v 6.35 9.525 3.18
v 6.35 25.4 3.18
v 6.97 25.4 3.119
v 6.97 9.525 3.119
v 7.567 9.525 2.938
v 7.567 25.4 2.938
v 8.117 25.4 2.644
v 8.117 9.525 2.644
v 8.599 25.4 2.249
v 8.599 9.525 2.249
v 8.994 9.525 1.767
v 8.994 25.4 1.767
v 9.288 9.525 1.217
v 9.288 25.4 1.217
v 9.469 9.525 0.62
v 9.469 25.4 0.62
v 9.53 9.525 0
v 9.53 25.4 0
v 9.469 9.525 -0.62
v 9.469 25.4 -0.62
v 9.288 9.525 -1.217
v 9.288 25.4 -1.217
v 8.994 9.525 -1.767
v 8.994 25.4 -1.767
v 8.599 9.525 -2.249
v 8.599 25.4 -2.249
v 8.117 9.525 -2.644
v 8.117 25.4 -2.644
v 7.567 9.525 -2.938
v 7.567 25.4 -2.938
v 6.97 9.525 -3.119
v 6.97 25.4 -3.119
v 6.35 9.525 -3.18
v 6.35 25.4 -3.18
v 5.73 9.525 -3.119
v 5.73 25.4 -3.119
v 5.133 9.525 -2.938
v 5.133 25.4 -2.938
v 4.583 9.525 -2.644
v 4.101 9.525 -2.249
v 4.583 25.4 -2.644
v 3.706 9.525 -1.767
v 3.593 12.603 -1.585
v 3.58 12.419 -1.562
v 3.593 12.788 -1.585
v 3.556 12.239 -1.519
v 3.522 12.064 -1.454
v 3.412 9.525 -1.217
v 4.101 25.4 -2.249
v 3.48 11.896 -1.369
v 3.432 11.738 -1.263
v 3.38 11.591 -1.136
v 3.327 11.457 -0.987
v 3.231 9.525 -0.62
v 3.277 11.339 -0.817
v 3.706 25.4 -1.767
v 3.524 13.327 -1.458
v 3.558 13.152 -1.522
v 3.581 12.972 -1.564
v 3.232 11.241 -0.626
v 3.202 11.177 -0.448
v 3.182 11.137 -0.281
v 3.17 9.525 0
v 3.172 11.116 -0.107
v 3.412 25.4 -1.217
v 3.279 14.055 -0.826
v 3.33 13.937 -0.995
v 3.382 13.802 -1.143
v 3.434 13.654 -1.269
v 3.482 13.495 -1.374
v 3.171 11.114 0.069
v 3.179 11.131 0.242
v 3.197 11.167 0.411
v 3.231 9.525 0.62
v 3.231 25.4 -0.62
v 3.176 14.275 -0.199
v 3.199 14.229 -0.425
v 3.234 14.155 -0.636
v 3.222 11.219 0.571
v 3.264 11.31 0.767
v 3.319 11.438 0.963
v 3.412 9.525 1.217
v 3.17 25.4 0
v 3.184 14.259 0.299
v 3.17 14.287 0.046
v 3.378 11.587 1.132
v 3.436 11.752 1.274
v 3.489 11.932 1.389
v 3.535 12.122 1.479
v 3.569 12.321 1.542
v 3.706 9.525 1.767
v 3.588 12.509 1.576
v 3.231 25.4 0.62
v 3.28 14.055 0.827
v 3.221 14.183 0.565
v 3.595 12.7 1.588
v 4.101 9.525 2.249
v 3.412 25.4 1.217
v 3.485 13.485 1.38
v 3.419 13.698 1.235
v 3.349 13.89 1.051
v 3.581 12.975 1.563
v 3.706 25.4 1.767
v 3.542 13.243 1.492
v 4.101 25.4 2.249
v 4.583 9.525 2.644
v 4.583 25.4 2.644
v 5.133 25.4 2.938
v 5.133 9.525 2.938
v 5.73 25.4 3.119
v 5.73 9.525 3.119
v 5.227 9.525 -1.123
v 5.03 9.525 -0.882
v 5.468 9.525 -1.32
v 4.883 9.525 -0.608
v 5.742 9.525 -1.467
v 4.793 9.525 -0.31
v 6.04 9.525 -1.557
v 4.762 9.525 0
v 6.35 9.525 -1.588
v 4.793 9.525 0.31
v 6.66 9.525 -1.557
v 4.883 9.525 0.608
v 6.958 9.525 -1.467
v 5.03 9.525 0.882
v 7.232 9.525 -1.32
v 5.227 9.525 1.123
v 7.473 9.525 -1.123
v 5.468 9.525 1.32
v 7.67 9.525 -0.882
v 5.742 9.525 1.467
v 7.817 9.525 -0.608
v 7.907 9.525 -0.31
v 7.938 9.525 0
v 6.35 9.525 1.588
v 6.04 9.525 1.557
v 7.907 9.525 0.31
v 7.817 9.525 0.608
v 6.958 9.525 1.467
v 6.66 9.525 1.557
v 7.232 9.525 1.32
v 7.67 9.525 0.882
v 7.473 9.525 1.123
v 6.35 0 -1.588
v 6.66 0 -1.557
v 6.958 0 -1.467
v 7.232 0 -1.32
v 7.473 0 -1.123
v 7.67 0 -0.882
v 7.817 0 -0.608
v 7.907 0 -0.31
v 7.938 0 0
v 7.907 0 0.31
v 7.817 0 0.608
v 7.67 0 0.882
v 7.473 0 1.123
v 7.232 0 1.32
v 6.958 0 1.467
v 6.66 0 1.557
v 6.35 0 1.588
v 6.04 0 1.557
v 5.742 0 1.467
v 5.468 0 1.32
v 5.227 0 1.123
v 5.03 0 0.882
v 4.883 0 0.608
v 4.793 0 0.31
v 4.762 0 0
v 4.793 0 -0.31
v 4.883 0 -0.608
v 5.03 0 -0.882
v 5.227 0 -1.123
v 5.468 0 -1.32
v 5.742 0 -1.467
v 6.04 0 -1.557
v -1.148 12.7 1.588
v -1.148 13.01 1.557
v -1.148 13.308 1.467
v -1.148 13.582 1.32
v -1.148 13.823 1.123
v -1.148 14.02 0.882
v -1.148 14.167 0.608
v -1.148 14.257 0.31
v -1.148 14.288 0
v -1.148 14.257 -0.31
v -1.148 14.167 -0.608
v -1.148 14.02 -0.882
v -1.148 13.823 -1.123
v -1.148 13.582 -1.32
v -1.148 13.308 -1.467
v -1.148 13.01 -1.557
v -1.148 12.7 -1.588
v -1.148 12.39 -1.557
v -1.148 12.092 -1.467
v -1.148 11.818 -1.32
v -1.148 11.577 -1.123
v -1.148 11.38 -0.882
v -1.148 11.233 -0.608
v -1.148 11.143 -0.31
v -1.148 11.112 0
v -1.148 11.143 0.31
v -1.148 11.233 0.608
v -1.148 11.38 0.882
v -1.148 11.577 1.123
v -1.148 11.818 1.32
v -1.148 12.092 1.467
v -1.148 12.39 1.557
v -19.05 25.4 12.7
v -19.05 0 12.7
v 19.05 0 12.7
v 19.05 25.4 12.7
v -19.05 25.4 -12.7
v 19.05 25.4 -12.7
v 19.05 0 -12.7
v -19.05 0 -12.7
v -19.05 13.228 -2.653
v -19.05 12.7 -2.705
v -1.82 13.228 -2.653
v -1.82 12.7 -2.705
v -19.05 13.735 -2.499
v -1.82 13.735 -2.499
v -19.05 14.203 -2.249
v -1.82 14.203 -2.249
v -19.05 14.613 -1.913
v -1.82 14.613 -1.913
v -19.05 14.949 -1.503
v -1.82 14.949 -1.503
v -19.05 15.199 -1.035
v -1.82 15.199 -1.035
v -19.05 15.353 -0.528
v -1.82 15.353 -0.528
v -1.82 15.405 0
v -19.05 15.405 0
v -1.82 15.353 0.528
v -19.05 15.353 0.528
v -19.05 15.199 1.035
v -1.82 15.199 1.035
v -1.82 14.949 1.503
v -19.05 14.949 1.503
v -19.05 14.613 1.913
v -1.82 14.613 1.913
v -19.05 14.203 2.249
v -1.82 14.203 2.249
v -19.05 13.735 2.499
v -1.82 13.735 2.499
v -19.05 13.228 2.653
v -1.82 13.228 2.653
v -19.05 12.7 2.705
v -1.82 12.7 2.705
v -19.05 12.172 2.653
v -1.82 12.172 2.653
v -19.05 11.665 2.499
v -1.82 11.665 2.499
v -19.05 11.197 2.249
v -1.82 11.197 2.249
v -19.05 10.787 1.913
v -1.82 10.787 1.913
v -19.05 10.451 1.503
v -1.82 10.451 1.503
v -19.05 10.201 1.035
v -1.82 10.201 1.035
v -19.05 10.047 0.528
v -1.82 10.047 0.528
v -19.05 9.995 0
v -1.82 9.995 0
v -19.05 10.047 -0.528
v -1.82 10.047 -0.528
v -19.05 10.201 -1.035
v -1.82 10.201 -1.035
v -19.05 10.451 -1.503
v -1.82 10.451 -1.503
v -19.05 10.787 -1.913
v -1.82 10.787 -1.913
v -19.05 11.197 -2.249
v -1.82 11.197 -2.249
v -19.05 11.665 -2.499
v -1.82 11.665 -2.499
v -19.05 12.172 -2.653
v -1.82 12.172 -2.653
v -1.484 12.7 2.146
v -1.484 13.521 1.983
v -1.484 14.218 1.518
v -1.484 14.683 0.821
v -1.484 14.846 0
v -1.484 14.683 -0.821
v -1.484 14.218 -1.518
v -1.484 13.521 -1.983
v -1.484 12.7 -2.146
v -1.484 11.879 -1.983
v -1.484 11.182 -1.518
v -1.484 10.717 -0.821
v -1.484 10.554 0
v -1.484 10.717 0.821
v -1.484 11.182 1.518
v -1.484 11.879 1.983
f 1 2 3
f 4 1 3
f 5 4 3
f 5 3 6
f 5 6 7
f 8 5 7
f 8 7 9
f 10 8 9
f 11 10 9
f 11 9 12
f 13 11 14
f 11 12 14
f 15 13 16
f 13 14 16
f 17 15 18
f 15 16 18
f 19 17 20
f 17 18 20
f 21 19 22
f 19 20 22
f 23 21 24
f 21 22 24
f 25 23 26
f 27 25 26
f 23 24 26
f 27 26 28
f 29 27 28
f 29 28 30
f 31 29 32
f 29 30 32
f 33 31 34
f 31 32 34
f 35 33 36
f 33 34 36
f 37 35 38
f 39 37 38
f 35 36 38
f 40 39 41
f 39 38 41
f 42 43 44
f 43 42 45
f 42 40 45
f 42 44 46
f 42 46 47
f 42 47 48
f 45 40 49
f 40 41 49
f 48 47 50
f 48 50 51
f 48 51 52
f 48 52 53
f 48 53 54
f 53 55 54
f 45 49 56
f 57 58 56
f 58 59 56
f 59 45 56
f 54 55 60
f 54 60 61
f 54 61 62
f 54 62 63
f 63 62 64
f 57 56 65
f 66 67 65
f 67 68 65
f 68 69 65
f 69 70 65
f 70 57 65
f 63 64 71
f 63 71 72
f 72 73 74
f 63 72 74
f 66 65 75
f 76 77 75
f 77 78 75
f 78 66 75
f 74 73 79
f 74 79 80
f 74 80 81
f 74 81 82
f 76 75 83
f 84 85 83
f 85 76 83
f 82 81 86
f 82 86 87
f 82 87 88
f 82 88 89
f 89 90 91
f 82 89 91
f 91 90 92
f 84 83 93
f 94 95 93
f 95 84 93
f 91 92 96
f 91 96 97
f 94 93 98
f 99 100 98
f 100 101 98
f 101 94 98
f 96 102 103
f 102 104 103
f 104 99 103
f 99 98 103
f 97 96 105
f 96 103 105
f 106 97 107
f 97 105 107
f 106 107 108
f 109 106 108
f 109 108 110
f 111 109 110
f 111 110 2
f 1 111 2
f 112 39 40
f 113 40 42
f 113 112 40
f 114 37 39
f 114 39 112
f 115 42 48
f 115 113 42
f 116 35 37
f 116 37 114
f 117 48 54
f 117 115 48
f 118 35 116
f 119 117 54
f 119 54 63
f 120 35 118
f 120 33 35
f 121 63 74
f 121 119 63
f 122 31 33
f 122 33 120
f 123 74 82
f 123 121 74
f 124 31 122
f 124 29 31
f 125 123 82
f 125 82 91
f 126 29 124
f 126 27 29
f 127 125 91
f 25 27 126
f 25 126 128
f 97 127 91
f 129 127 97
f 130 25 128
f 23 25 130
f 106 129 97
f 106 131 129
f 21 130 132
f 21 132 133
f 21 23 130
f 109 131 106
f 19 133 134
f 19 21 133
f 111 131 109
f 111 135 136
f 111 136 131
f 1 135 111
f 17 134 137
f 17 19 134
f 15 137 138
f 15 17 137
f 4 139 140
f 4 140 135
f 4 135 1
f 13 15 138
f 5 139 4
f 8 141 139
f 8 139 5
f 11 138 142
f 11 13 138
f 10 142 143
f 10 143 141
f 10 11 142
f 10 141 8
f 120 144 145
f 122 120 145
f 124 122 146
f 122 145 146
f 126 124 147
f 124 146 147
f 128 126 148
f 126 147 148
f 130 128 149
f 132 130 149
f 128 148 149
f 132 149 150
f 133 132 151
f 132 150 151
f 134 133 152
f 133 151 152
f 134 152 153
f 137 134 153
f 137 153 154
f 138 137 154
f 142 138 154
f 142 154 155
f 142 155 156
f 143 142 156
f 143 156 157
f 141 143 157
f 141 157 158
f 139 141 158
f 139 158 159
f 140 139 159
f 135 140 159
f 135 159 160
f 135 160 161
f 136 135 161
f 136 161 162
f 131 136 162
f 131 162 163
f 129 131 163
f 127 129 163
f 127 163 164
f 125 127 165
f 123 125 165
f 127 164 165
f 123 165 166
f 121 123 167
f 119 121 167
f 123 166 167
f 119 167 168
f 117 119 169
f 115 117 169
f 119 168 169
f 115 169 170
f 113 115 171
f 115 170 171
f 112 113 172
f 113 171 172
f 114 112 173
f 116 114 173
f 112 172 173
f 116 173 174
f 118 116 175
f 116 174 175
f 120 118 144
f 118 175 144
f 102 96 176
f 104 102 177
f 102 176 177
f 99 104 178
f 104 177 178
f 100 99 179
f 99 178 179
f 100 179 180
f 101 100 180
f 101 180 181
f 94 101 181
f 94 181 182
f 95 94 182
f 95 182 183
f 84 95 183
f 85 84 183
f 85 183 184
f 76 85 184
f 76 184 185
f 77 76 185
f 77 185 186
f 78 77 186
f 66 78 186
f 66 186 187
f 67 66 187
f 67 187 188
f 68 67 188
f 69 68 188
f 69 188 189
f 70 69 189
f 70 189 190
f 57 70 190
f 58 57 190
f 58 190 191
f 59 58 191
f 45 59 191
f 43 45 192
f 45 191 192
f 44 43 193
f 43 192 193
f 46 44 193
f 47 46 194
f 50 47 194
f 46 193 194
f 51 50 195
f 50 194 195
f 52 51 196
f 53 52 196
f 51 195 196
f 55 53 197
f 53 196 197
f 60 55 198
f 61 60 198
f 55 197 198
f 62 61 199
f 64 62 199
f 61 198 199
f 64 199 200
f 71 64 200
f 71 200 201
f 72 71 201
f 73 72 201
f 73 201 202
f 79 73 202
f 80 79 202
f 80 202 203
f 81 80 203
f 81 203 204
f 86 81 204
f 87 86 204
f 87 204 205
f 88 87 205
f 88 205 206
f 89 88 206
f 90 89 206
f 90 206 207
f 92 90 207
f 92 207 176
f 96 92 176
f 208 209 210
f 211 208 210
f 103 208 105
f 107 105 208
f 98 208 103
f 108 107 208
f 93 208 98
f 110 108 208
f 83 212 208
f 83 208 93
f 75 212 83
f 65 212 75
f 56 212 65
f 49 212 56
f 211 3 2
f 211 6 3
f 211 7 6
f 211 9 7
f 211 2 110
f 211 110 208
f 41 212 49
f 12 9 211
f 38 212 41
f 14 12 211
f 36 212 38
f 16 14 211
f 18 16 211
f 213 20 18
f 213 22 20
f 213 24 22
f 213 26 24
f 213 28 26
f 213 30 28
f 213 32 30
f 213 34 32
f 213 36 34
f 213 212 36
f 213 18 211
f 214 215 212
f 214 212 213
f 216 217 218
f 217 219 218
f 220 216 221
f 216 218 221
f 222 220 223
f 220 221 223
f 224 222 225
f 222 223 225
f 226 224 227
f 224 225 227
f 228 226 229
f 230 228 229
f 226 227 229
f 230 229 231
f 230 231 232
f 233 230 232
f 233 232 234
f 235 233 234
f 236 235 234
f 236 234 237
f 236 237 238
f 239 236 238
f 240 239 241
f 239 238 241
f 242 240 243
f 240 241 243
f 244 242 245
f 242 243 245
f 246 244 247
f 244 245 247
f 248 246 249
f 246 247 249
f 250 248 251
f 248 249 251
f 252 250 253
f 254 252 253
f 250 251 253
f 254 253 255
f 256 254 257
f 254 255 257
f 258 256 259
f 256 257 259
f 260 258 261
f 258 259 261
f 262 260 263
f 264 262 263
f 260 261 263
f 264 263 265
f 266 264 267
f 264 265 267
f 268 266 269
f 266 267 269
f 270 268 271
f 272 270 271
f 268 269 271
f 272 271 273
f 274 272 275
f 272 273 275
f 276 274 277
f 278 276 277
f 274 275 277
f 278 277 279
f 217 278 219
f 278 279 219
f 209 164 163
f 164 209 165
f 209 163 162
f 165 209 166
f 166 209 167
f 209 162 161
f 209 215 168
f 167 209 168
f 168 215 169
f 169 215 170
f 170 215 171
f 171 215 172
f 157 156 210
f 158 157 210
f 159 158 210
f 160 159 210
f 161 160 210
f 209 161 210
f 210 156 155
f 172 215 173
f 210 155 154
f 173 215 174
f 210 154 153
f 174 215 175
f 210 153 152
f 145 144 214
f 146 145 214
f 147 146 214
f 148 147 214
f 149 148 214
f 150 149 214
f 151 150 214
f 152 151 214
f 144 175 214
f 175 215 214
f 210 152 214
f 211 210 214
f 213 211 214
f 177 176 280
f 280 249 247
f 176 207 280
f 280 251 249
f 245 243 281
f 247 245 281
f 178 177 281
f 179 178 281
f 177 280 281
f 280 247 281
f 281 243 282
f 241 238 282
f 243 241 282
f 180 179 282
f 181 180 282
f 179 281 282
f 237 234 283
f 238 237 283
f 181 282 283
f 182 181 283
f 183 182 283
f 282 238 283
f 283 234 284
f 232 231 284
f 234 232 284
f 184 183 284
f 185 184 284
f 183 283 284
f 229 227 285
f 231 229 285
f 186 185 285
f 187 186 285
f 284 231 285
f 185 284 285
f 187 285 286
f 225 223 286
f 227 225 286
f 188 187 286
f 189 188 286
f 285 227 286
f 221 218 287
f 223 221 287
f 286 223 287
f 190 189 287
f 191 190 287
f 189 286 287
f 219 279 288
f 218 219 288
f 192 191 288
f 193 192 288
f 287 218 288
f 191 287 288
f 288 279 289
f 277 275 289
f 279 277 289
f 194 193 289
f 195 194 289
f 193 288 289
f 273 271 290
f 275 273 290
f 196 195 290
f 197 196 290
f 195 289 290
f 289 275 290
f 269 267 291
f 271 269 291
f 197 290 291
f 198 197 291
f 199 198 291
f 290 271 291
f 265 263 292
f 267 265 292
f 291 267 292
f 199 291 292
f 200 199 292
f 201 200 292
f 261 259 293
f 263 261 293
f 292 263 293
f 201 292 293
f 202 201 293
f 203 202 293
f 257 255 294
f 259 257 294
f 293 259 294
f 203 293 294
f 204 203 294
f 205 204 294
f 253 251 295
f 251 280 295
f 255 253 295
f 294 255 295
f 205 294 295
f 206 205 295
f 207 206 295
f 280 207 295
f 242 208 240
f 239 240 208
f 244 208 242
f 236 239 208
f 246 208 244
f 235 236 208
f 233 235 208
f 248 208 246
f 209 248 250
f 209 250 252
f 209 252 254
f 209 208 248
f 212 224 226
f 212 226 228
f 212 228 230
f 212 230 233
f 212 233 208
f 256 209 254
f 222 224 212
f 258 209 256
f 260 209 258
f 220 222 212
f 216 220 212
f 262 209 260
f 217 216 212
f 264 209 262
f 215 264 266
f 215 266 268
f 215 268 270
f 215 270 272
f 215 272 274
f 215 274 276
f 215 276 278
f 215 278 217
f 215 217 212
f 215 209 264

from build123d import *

# Parameters (mm, degrees)
SKETCH1_W                   = 38.1
SKETCH1_H                   = 25.4
BOSS_EXTRUDE1_DEPTH         = 25.4
SKETCH3_R                   = 1.5875
CUT_EXTRUDE2_DEPTH          = 25.4
F_1_4_28_TAPPED_HOLE1_D     = 5.4102
F_1_4_28_TAPPED_HOLE1_DEPTH = 17.23
F_1_4_28_TAPPED_HOLE1_TIP   = 1.625388061
SKETCH2_R                   = 3.18
CUT_EXTRUDE6_DEPTH          = 15.875
SKETCH8_R                   = 1.5875
CUT_EXTRUDE7_DEPTH          = 35.1957966


with BuildPart() as part:
    # Sketch1 → Boss-Extrude1 (new body)
    with BuildSketch(Plane(origin=(0, 0, 0), x_dir=(1, 0, 0), z_dir=(0, 1, 0))):
        Rectangle(SKETCH1_W, SKETCH1_H)
    extrude(amount=BOSS_EXTRUDE1_DEPTH)

    # Sketch3 → Cut-Extrude2 (cut)
    with BuildSketch(Plane.ZY.offset(19.05)):
        with Locations((0, 12.7)):
            Circle(SKETCH3_R)
    extrude(amount=-CUT_EXTRUDE2_DEPTH, mode=Mode.SUBTRACT)

    # 1/4-28 Tapped Hole1
    with Locations(Plane.ZY.offset(19.05)):
        with Locations((0, 12.7)):
            Hole(F_1_4_28_TAPPED_HOLE1_D / 2, depth=F_1_4_28_TAPPED_HOLE1_DEPTH)
            with Locations((0, 0, -(F_1_4_28_TAPPED_HOLE1_DEPTH + F_1_4_28_TAPPED_HOLE1_TIP / 2))):  # 118° drill point
                Cone(0, F_1_4_28_TAPPED_HOLE1_D / 2, F_1_4_28_TAPPED_HOLE1_TIP, mode=Mode.SUBTRACT)

    # Sketch2 → Cut-Extrude6 (cut)
    with BuildSketch(Plane(origin=(0, 25.4, 0), x_dir=(1, 0, 0), z_dir=(0, 1, 0))):
        with Locations(Location((6.35, 0, 0), (0, 0, 270))):
            Circle(SKETCH2_R)
    extrude(amount=-CUT_EXTRUDE6_DEPTH, mode=Mode.SUBTRACT)

    # Sketch8 → Cut-Extrude7 (cut, through all)
    with BuildSketch(Plane.XZ):
        with Locations(Location((6.35, 0, 0), (0, 0, 270))):
            Circle(SKETCH8_R)
    extrude(amount=-CUT_EXTRUDE7_DEPTH, mode=Mode.SUBTRACT)


solid = part.part
